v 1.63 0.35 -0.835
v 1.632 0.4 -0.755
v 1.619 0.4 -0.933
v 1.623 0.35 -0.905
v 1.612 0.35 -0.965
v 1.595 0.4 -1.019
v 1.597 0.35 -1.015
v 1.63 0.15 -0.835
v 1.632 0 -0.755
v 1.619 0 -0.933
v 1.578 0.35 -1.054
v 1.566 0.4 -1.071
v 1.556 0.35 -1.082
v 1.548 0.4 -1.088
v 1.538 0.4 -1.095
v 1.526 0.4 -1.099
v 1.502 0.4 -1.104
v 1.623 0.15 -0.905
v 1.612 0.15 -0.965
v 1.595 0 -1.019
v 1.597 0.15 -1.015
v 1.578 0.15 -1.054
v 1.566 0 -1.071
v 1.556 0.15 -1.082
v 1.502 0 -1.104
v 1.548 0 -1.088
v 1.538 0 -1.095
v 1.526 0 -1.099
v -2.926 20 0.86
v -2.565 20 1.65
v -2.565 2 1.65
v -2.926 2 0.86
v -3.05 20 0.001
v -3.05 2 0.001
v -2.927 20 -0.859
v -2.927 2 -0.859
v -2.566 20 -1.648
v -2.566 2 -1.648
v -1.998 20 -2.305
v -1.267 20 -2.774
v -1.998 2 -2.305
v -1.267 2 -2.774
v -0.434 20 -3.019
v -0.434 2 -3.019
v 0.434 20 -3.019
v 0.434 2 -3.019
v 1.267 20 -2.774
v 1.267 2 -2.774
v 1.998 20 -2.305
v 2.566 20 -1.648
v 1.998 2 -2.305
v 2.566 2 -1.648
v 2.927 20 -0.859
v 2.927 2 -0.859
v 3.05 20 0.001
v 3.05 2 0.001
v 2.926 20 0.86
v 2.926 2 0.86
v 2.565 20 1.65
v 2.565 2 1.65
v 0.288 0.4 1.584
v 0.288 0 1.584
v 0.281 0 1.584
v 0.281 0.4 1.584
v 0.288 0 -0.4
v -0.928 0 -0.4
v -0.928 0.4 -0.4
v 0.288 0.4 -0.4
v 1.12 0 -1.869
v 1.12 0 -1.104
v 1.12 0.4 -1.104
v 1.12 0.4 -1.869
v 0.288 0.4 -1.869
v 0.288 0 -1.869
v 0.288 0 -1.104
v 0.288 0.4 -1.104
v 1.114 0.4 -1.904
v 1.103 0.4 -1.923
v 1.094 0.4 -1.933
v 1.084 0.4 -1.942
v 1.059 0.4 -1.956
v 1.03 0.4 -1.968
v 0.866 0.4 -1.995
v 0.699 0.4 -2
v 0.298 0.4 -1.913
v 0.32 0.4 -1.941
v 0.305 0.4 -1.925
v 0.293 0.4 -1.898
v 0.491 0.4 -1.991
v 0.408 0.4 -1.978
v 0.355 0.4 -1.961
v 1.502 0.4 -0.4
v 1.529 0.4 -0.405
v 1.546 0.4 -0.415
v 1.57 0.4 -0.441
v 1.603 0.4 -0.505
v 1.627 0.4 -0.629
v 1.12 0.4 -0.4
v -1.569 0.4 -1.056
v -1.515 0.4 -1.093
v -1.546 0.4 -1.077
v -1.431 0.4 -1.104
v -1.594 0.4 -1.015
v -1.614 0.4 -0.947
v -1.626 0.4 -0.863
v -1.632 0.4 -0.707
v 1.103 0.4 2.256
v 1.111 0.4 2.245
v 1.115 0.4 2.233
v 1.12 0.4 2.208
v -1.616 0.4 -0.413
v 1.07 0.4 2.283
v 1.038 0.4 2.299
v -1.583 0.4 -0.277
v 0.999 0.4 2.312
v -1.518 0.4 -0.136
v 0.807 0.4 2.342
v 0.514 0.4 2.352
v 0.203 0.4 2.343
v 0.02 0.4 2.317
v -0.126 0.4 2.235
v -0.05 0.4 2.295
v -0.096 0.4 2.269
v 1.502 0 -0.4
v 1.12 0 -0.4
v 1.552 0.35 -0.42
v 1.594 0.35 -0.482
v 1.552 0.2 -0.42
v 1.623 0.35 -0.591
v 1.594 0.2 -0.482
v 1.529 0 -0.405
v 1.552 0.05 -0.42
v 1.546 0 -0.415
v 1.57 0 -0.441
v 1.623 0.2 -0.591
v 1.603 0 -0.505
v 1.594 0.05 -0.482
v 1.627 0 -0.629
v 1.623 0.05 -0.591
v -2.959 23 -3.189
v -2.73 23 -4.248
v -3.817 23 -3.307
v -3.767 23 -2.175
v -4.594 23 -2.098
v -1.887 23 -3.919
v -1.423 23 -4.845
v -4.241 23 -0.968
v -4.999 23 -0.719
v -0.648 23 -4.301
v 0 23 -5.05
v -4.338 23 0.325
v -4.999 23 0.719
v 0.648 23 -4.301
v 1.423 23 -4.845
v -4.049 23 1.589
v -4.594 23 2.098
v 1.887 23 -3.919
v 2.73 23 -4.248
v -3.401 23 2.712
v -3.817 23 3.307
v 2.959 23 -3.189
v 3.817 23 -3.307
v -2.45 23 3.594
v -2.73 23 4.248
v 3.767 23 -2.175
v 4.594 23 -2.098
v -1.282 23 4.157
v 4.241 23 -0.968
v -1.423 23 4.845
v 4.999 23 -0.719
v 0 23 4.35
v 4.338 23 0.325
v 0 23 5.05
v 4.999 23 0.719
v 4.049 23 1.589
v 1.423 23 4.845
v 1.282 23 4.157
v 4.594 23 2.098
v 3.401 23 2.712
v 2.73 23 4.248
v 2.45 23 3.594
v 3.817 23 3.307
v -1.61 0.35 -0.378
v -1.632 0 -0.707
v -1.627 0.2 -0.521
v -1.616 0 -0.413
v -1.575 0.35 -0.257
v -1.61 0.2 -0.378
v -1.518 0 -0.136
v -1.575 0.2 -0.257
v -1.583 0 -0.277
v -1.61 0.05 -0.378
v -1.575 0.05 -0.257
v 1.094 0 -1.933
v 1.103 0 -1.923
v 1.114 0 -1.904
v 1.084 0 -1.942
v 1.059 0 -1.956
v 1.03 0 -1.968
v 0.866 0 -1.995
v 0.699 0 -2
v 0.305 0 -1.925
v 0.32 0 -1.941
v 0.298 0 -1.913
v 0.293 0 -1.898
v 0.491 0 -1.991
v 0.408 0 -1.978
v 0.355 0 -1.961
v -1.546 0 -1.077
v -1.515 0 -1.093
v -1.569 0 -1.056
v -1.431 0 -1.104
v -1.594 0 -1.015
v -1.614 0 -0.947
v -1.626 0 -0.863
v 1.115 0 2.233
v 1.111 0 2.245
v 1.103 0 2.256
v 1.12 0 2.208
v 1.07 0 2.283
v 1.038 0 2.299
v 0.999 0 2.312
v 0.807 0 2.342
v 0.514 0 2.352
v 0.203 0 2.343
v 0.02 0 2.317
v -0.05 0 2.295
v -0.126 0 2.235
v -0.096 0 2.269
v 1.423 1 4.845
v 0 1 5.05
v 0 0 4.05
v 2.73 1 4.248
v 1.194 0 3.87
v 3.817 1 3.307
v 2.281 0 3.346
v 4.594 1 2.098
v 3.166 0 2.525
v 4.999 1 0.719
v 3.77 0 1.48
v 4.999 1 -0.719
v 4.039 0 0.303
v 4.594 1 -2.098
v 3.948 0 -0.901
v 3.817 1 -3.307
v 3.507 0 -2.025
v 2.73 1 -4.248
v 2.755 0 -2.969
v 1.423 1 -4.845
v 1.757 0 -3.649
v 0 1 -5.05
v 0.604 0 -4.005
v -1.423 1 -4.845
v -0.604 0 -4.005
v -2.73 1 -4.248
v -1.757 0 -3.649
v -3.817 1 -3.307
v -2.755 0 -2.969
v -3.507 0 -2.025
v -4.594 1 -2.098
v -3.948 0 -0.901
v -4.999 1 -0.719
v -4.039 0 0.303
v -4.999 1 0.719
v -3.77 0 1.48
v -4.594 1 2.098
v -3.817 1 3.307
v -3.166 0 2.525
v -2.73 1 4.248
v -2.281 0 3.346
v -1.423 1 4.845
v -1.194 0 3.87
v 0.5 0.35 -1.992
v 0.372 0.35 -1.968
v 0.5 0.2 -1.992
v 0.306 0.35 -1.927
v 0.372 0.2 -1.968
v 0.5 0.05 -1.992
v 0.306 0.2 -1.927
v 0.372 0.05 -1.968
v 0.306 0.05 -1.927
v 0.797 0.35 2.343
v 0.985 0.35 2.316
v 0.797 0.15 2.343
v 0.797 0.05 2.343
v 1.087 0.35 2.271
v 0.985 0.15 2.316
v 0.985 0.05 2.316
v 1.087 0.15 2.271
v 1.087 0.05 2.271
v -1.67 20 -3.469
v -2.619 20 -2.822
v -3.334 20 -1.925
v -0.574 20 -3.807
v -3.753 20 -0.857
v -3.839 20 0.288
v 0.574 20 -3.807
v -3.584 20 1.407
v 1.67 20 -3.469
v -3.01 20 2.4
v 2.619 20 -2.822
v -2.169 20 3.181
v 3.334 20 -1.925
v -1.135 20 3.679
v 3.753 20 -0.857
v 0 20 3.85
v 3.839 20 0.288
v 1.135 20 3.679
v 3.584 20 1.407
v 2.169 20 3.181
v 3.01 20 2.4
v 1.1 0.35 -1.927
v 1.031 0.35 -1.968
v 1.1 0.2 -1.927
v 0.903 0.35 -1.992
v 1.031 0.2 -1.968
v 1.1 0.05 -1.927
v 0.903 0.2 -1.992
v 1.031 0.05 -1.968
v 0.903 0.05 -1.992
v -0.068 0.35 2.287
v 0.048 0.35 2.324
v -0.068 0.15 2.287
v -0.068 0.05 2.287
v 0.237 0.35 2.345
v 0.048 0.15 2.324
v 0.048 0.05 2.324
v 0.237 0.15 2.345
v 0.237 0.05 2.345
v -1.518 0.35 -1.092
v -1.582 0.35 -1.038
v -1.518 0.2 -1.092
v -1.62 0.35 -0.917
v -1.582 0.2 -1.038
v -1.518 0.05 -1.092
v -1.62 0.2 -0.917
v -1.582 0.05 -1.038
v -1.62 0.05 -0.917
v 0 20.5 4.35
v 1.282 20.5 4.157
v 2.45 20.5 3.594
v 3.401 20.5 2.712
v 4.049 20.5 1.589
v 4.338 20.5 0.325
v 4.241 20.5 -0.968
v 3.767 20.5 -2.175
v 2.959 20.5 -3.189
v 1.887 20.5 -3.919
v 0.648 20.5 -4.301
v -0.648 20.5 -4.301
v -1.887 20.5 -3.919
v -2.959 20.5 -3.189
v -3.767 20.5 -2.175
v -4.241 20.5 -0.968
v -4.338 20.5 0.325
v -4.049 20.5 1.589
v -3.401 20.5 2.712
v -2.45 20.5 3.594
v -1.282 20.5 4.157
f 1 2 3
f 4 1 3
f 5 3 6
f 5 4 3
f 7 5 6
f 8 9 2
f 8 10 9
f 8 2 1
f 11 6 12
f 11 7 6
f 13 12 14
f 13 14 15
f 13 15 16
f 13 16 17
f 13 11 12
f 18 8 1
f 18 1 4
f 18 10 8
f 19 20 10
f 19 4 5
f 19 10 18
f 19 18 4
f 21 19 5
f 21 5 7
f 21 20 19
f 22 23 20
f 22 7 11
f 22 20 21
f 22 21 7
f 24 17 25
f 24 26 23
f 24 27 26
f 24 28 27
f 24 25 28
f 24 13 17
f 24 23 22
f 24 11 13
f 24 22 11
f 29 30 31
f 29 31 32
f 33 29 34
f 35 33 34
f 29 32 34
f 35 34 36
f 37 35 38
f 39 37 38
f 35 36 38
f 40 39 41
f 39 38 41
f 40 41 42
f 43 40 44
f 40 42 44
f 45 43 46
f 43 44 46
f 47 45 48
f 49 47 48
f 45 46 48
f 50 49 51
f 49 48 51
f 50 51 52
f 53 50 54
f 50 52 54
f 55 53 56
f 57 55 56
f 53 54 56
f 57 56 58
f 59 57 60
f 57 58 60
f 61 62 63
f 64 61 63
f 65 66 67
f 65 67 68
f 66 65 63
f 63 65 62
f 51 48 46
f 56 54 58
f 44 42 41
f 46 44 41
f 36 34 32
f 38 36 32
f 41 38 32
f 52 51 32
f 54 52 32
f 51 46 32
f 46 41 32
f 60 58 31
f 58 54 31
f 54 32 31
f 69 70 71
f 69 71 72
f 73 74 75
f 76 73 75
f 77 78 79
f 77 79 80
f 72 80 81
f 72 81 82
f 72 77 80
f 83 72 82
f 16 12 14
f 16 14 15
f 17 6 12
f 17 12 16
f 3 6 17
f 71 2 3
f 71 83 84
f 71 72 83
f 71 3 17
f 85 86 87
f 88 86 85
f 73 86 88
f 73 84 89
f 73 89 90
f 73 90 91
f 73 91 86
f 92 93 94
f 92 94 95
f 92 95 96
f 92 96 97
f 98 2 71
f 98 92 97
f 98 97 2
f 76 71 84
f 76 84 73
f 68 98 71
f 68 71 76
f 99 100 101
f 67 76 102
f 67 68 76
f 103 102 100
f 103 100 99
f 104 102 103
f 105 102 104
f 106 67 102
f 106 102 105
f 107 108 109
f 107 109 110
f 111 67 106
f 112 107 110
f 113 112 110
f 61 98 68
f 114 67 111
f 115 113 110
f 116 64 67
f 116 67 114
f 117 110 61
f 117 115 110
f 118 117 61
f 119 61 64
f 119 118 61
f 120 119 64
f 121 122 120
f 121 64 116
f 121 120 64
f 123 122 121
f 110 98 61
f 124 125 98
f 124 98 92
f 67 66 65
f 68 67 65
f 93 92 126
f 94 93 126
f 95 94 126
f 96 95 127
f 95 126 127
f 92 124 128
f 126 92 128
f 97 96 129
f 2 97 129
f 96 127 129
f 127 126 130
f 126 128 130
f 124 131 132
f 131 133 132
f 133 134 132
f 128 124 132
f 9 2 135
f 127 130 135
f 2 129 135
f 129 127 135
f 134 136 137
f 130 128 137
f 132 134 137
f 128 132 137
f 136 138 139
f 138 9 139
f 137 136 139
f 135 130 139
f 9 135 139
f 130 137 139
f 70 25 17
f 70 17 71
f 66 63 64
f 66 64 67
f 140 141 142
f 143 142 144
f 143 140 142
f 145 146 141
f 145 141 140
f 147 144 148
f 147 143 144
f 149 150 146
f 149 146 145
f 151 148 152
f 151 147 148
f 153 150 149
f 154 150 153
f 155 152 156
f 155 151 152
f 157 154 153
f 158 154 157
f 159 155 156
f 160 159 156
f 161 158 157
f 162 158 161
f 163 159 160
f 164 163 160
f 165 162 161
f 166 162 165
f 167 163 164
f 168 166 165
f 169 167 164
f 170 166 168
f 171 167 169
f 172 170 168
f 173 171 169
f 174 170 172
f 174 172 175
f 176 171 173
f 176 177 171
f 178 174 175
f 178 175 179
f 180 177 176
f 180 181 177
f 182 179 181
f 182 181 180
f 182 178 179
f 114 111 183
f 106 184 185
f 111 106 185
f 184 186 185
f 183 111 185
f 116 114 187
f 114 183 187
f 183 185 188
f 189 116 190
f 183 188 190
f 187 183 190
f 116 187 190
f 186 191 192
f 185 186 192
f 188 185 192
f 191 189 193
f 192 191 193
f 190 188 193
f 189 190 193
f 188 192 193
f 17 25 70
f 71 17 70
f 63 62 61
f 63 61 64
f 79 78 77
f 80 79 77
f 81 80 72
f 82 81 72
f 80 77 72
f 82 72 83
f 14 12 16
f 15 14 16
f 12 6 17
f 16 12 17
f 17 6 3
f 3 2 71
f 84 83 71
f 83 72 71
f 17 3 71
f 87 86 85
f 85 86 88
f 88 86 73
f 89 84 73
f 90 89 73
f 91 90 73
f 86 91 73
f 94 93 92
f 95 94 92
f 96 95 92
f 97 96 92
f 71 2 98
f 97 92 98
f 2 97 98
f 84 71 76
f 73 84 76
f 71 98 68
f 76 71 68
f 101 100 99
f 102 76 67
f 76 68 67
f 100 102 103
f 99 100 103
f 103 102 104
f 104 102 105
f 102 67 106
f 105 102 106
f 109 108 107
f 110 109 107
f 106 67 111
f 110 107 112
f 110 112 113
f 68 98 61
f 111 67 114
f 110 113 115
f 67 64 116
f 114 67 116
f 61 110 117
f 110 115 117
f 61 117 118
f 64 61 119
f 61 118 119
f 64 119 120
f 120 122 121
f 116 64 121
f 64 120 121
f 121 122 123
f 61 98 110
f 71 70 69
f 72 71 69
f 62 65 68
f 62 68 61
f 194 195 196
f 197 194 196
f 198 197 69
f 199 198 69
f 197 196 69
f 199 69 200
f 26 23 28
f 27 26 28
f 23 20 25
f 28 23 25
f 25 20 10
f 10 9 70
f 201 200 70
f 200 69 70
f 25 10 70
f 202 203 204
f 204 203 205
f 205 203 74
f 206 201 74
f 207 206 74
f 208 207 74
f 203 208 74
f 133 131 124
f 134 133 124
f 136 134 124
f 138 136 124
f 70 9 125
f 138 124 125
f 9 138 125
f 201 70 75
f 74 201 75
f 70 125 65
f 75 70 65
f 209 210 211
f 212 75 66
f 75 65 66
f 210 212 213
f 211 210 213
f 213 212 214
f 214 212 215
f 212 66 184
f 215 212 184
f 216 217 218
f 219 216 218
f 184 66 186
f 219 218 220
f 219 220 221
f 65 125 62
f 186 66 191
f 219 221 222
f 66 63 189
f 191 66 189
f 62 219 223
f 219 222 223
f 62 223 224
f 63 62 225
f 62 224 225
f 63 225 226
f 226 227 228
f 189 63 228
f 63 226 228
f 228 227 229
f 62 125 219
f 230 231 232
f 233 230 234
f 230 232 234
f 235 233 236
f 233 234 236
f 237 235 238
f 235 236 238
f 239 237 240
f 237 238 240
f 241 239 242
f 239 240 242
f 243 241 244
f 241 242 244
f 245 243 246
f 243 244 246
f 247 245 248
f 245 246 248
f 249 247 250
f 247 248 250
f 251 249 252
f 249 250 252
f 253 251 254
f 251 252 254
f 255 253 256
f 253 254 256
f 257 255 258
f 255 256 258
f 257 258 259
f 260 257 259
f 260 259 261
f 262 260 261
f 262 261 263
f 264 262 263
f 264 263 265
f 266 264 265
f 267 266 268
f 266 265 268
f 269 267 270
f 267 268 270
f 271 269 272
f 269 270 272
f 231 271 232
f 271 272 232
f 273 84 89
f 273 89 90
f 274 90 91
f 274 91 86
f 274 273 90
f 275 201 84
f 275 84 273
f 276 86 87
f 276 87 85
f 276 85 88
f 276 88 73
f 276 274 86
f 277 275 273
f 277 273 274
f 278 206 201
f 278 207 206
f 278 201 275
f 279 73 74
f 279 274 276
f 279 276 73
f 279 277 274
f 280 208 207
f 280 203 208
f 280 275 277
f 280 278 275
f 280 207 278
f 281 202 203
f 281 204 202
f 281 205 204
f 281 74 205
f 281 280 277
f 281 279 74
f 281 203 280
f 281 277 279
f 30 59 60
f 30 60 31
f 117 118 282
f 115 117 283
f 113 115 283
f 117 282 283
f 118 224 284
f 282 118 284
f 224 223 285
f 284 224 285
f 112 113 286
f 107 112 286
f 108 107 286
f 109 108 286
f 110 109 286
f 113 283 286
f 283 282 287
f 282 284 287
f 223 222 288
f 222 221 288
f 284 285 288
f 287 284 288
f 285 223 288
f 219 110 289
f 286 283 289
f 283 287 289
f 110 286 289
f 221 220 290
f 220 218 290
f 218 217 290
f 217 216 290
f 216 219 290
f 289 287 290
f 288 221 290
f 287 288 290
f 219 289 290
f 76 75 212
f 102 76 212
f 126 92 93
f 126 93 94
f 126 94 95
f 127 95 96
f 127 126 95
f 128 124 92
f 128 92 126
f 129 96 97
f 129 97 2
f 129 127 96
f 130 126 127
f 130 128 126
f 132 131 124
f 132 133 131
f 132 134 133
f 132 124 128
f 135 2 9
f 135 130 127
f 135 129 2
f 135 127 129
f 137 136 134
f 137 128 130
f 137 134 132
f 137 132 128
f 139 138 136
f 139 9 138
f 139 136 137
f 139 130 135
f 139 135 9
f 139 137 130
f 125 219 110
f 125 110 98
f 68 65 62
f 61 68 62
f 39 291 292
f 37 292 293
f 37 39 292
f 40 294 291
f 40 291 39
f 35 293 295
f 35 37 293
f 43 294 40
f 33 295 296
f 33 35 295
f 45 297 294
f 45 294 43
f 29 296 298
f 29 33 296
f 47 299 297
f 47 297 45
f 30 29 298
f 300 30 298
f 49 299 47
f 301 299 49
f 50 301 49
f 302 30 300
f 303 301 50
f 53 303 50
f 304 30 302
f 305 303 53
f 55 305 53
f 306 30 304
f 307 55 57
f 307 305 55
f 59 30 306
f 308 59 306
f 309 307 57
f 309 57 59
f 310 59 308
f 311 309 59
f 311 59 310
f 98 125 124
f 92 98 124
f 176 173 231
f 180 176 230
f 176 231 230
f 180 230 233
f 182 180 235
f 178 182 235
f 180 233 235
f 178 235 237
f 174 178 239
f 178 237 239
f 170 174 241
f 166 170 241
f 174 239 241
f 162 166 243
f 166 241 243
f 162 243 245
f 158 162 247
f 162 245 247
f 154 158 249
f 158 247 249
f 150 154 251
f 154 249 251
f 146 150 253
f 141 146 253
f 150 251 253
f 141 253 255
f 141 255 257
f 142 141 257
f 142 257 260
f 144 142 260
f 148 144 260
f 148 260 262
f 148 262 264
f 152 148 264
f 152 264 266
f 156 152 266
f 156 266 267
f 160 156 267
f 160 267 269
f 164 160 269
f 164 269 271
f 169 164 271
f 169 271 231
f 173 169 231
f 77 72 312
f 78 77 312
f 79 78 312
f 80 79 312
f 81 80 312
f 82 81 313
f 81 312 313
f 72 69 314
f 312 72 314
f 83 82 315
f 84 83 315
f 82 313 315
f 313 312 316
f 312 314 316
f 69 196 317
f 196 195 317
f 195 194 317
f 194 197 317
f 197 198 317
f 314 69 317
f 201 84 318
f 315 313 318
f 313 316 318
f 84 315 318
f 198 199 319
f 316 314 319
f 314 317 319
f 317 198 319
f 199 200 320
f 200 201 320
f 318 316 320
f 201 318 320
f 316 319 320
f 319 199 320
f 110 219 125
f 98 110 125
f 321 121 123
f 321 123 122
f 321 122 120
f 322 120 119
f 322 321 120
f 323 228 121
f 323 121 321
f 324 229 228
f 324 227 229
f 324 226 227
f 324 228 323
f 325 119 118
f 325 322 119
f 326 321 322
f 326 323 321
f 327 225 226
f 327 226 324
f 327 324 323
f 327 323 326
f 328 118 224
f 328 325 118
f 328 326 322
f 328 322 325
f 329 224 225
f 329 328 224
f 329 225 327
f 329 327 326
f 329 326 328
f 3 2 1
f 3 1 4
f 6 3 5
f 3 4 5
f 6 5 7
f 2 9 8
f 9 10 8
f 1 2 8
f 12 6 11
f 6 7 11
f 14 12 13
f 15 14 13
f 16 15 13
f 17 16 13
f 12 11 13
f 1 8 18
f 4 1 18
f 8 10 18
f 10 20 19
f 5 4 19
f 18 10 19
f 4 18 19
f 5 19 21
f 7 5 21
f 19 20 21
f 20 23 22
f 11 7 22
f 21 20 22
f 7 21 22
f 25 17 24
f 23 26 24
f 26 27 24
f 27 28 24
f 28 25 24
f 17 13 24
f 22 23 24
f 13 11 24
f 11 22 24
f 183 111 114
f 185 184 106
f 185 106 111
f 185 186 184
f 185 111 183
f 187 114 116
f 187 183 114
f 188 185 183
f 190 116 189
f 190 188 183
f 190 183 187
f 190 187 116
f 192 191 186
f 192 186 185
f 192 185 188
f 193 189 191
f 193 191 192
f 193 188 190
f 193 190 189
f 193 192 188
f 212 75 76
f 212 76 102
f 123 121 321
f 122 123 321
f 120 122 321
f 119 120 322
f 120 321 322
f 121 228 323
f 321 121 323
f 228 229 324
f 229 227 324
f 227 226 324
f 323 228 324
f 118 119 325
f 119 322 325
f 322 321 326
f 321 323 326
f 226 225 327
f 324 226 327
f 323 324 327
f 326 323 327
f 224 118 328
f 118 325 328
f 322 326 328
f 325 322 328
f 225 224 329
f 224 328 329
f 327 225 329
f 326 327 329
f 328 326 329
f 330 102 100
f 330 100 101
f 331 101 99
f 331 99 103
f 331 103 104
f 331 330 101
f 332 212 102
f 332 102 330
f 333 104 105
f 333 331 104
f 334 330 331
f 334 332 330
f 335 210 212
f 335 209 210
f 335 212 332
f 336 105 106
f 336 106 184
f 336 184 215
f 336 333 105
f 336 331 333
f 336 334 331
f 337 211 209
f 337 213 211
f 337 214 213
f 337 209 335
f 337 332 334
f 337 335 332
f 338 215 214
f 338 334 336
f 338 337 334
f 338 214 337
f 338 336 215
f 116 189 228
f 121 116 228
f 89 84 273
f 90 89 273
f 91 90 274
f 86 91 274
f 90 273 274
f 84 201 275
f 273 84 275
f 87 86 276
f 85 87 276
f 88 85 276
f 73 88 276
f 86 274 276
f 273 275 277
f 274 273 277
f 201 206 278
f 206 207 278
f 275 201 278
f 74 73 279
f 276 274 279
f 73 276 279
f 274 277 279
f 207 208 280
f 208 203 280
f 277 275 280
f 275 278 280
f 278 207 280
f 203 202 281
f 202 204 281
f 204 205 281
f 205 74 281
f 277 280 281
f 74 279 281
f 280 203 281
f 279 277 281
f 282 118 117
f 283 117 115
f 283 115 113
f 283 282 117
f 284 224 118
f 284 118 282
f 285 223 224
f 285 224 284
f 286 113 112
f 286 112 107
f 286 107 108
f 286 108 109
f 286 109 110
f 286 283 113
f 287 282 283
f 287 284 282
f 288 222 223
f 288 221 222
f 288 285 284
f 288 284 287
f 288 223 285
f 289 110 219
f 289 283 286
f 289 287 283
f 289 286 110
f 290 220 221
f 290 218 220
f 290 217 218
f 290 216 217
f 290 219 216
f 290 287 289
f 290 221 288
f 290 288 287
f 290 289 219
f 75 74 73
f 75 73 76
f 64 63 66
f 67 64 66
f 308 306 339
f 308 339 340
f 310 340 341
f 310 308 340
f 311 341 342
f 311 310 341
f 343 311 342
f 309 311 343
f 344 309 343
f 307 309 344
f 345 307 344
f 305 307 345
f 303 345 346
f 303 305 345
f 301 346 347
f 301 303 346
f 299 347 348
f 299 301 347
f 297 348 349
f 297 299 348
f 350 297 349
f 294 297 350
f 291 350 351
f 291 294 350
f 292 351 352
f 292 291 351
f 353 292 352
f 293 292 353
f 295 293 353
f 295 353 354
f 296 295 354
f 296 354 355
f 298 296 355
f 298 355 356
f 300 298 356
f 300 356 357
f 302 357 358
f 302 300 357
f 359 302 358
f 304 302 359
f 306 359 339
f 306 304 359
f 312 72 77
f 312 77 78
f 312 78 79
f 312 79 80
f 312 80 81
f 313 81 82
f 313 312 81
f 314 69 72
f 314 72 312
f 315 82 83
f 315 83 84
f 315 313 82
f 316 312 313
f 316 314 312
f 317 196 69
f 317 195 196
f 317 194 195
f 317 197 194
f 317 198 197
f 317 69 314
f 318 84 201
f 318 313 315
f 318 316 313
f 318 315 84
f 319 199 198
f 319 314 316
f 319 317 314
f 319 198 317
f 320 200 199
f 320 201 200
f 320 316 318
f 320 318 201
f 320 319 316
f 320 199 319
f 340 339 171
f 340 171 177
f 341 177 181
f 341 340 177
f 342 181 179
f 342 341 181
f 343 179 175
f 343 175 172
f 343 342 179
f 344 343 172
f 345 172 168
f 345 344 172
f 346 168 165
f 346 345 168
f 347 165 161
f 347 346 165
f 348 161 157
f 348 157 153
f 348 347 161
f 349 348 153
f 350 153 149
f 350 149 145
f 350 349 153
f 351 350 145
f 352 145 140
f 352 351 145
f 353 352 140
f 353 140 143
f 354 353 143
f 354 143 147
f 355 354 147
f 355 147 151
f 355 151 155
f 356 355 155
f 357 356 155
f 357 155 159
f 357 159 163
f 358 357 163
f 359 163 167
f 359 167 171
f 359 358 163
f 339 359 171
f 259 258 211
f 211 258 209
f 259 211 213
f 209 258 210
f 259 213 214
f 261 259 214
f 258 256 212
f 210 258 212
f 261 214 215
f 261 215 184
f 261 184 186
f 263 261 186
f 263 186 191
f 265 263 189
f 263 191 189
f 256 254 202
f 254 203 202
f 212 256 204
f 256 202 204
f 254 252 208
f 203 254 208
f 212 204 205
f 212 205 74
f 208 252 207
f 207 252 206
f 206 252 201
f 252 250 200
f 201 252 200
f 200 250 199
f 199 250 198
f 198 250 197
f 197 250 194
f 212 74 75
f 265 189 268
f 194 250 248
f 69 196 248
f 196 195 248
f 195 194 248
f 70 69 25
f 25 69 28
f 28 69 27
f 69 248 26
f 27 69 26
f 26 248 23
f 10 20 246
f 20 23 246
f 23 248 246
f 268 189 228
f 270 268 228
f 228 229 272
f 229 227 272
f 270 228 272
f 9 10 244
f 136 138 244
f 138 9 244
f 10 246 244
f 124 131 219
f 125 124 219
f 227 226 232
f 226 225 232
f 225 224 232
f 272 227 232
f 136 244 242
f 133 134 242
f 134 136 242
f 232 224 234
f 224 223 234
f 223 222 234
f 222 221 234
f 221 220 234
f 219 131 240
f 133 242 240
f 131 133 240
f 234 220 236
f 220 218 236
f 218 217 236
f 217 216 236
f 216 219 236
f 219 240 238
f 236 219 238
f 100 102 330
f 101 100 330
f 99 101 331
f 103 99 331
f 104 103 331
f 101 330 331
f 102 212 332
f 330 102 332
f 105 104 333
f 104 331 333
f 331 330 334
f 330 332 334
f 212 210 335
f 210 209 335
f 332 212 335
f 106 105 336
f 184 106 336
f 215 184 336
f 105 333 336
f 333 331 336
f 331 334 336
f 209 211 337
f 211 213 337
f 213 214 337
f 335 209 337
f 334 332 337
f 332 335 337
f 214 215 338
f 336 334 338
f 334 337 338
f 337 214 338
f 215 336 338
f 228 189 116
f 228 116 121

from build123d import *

# Parameters (mm, degrees)
SKETCH1_R           = 5.05
BOSS_EXTRUDE1_DEPTH = 20
SKETCH2_R           = 5.05
BOSS_EXTRUDE2_DEPTH = 2
SKETCH4_R           = 5.05
SKETCH4_R_2         = 4.35
BOSS_EXTRUDE3_DEPTH = 3
CHAMFER1_SIZE       = 1
CHAMFER2_SIZE       = 0.5
CUT_EXTRUDE1_DEPTH  = 0.4
BOSS_EXTRUDE4_DEPTH = 0.4


with BuildPart() as part:
    # Sketch1 → Boss-Extrude1 (new body)
    with BuildSketch(Plane(origin=(0, 0, 0), x_dir=(1, 0, 0), z_dir=(0, 1, 0))):
        Circle(SKETCH1_R)
        with BuildLine():
            Line((2.565151068, -1.65), (-2.565151068, -1.65))
            ThreePointArc((-2.565151068, -1.65), (0, 3.05), (2.565151068, -1.65))
        make_face(mode=Mode.SUBTRACT)
    extrude(amount=BOSS_EXTRUDE1_DEPTH)

    # Sketch2 → Boss-Extrude2 (add)
    with BuildSketch(Plane.XZ):
        Circle(SKETCH2_R)
    extrude(amount=-BOSS_EXTRUDE2_DEPTH)

    # Sketch4 → Boss-Extrude3 (add)
    with BuildSketch(Plane(origin=(0, 20, 0), x_dir=(1, 0, 0), z_dir=(0, 1, 0))):
        Circle(SKETCH4_R)
        Circle(SKETCH4_R_2, mode=Mode.SUBTRACT)
    extrude(amount=BOSS_EXTRUDE3_DEPTH)

    # Chamfer1
    chamfer1_edges = [part.edges().sort_by_distance(p)[0] for p in [
        (-5.05, 0, 0),
    ]]
    chamfer(chamfer1_edges, length=CHAMFER1_SIZE)

    # Chamfer2
    chamfer2_edges = [part.edges().sort_by_distance(p)[0] for p in [
        (-4.35, 20, 0),
    ]]
    chamfer(chamfer2_edges, length=CHAMFER2_SIZE)

    # Sketch5 → Cut-Extrude1 (cut)
    with BuildSketch(Plane.XZ):
        with BuildLine():
            add(Edge.make_bspline(
                [(1.631941732, -0.755044451), (1.631711834, -0.781729287), (1.631279836, -0.83187248), (1.624169455, -0.902071791), (1.61354776, -0.962360211), (1.59926486, -1.012775634), (1.580315281, -1.052346406), (1.558755386, -1.082359327), (1.53114696, -1.099834777), (1.51147004, -1.102663084), (1.501946373, -1.10403199)],
                knots=[0, 0, 0, 0, 1.593603655, 2.994523807, 4.209267046, 5.248799156, 6.112701127, 6.821812225, 7.429754874, 8, 8, 8, 8], degree=3))
            Line((1.501946373, -1.10403199), (1.119960012, -1.10403199))
            Line((1.119960012, -1.10403199), (1.119960012, -1.869004677))
            add(Edge.make_bspline(
                [(1.119960012, -1.869004677), (1.1190276, -1.879514942), (1.11717803, -1.900363512), (1.100781449, -1.929606387), (1.070457056, -1.952360817), (1.02775066, -1.970719903), (0.970204741, -1.983922011), (0.897251108, -1.993498632), (0.805057261, -1.999216421), (0.736982299, -1.999719258), (0.698975043, -2)],
                knots=[0, 0, 0, 0, 0.525703783, 1.042806514, 1.625893093, 2.39765282, 3.364048858, 4.581030562, 6.091138931, 8, 8, 8, 8], degree=3))
            add(Edge.make_bspline(
                [(0.698975043, -2), (0.662638483, -1.999680966), (0.596237721, -1.99909797), (0.505670365, -1.993549267), (0.432822332, -1.9837837), (0.375587998, -1.97121932), (0.334351205, -1.952054514), (0.304709495, -1.929821711), (0.291231595, -1.899809452), (0.289087047, -1.87943166), (0.287989717, -1.869004677)],
                knots=[0, 0, 0, 0, 1.858233089, 3.39570102, 4.63473153, 5.61863636, 6.373449397, 6.953985978, 7.464771718, 8, 8, 8, 8], degree=3))
            Line((0.287989717, -1.869004677), (0.287989717, -1.10403199))
            Line((0.287989717, -1.10403199), (-1.430948908, -1.10403199))
            add(Edge.make_bspline(
                [(-1.430948908, -1.10403199), (-1.446295186, -1.103412765), (-1.475615652, -1.102229679), (-1.518140665, -1.094427216), (-1.555773037, -1.073109541), (-1.58616843, -1.036199626), (-1.607165622, -0.982245201), (-1.622758573, -0.910508327), (-1.630623202, -0.816535459), (-1.631467974, -0.746386513), (-1.631941732, -0.707046165)],
                knots=[0, 0, 0, 0, 0.721830018, 1.379122135, 2.010344175, 2.710096748, 3.579823955, 4.704200885, 6.15167733, 8, 8, 8, 8], degree=3))
            add(Edge.make_bspline(
                [(-1.631941732, -0.707046165), (-1.631855992, -0.673710867), (-1.63169644, -0.611677654), (-1.627859181, -0.524581605), (-1.620675539, -0.448197107), (-1.61140423, -0.379463469), (-1.595930544, -0.316289463), (-1.575663182, -0.255996569), (-1.54871653, -0.196367872), (-1.528447294, -0.156646299), (-1.517945802, -0.136066551)],
                knots=[0, 0, 0, 0, 1.355920511, 2.523214427, 3.544523483, 4.476419512, 5.341300522, 6.18596521, 7.060148557, 8, 8, 8, 8], degree=3))
            Line((-1.517945802, -0.136066551), (-0.125995501, 2.234848795))
            add(Edge.make_bspline(
                [(-0.125995501, 2.234848795), (-0.118826649, 2.244678179), (-0.103261763, 2.266019564), (-0.065190235, 2.290144018), (-0.013803763, 2.309357894), (0.053587112, 2.326305114), (0.138951007, 2.338732104), (0.244225735, 2.345752456), (0.371271055, 2.350790371), (0.46364318, 2.351472752), (0.513981648, 2.351844618)],
                knots=[0, 0, 0, 0, 0.433899394, 0.942074677, 1.586920186, 2.403031765, 3.43269784, 4.681722832, 6.191694851, 8, 8, 8, 8], degree=3))
            add(Edge.make_bspline(
                [(0.513981648, 2.351844618), (0.565330252, 2.351666334), (0.659751295, 2.351338501), (0.789464206, 2.344069356), (0.895633515, 2.33449455), (0.978826037, 2.318529599), (1.042071686, 2.300153794), (1.085226569, 2.274596454), (1.115197825, 2.244496698), (1.118421934, 2.219685887), (1.119960012, 2.207849759)],
                knots=[0, 0, 0, 0, 1.870363282, 3.439268813, 4.733465961, 5.748069416, 6.52766601, 7.110840176, 7.575821608, 8, 8, 8, 8], degree=3))
            Line((1.119960012, 2.207849759), (1.119960012, -0.400057126))
            Line((1.119960012, -0.400057126), (1.501946373, -0.400057126))
            add(Edge.make_bspline(
                [(1.501946373, -0.400057126), (1.510823484, -0.401063547), (1.529189779, -0.403145781), (1.554586269, -0.420271717), (1.576158449, -0.44744336), (1.596465382, -0.484491265), (1.613298175, -0.533336076), (1.624583151, -0.595271866), (1.631275777, -0.67056467), (1.631707747, -0.725362278), (1.631941732, -0.755044451)],
                knots=[0, 0, 0, 0, 0.51983486, 1.075512151, 1.744218405, 2.552791553, 3.552578929, 4.773200779, 6.252142485, 8, 8, 8, 8], degree=3))
        make_face()
        Polygon((0.287989717, 1.583872038), (0.280989967, 1.583872038), (-0.927966867, -0.400057126), (0.287989717, -0.400057126), align=None, mode=Mode.SUBTRACT)
    extrude(amount=-CUT_EXTRUDE1_DEPTH, mode=Mode.SUBTRACT)


with BuildPart() as body_2:
    # Sketch5<2> → Boss-Extrude4 (new body)
    with BuildSketch(Plane.XZ):
        with BuildLine():
            add(Edge.make_bspline(
                [(1.631941732, -0.755044451), (1.631711834, -0.781729287), (1.631279836, -0.83187248), (1.624169455, -0.902071791), (1.61354776, -0.962360211), (1.59926486, -1.012775634), (1.580315281, -1.052346406), (1.558755386, -1.082359327), (1.53114696, -1.099834777), (1.51147004, -1.102663084), (1.501946373, -1.10403199)],
                knots=[0, 0, 0, 0, 1.593603655, 2.994523807, 4.209267046, 5.248799156, 6.112701127, 6.821812225, 7.429754874, 8, 8, 8, 8], degree=3))
            Line((1.501946373, -1.10403199), (1.119960012, -1.10403199))
            Line((1.119960012, -1.10403199), (1.119960012, -1.869004677))
            add(Edge.make_bspline(
                [(1.119960012, -1.869004677), (1.1190276, -1.879514942), (1.11717803, -1.900363512), (1.100781449, -1.929606387), (1.070457056, -1.952360817), (1.02775066, -1.970719903), (0.970204741, -1.983922011), (0.897251108, -1.993498632), (0.805057261, -1.999216421), (0.736982299, -1.999719258), (0.698975043, -2)],
                knots=[0, 0, 0, 0, 0.525703783, 1.042806514, 1.625893093, 2.39765282, 3.364048858, 4.581030562, 6.091138931, 8, 8, 8, 8], degree=3))
            add(Edge.make_bspline(
                [(0.698975043, -2), (0.662638483, -1.999680966), (0.596237721, -1.99909797), (0.505670365, -1.993549267), (0.432822332, -1.9837837), (0.375587998, -1.97121932), (0.334351205, -1.952054514), (0.304709495, -1.929821711), (0.291231595, -1.899809452), (0.289087047, -1.87943166), (0.287989717, -1.869004677)],
                knots=[0, 0, 0, 0, 1.858233089, 3.39570102, 4.63473153, 5.61863636, 6.373449397, 6.953985978, 7.464771718, 8, 8, 8, 8], degree=3))
            Line((0.287989717, -1.869004677), (0.287989717, -1.10403199))
            Line((0.287989717, -1.10403199), (-1.430948908, -1.10403199))
            add(Edge.make_bspline(
                [(-1.430948908, -1.10403199), (-1.446295186, -1.103412765), (-1.475615652, -1.102229679), (-1.518140665, -1.094427216), (-1.555773037, -1.073109541), (-1.58616843, -1.036199626), (-1.607165622, -0.982245201), (-1.622758573, -0.910508327), (-1.630623202, -0.816535459), (-1.631467974, -0.746386513), (-1.631941732, -0.707046165)],
                knots=[0, 0, 0, 0, 0.721830018, 1.379122135, 2.010344175, 2.710096748, 3.579823955, 4.704200885, 6.15167733, 8, 8, 8, 8], degree=3))
            add(Edge.make_bspline(
                [(-1.631941732, -0.707046165), (-1.631855992, -0.673710867), (-1.63169644, -0.611677654), (-1.627859181, -0.524581605), (-1.620675539, -0.448197107), (-1.61140423, -0.379463469), (-1.595930544, -0.316289463), (-1.575663182, -0.255996569), (-1.54871653, -0.196367872), (-1.528447294, -0.156646299), (-1.517945802, -0.136066551)],
                knots=[0, 0, 0, 0, 1.355920511, 2.523214427, 3.544523483, 4.476419512, 5.341300522, 6.18596521, 7.060148557, 8, 8, 8, 8], degree=3))
            Line((-1.517945802, -0.136066551), (-0.125995501, 2.234848795))
            add(Edge.make_bspline(
                [(-0.125995501, 2.234848795), (-0.118826649, 2.244678179), (-0.103261763, 2.266019564), (-0.065190235, 2.290144018), (-0.013803763, 2.309357894), (0.053587112, 2.326305114), (0.138951007, 2.338732104), (0.244225735, 2.345752456), (0.371271055, 2.350790371), (0.46364318, 2.351472752), (0.513981648, 2.351844618)],
                knots=[0, 0, 0, 0, 0.433899394, 0.942074677, 1.586920186, 2.403031765, 3.43269784, 4.681722832, 6.191694851, 8, 8, 8, 8], degree=3))
            add(Edge.make_bspline(
                [(0.513981648, 2.351844618), (0.565330252, 2.351666334), (0.659751295, 2.351338501), (0.789464206, 2.344069356), (0.895633515, 2.33449455), (0.978826037, 2.318529599), (1.042071686, 2.300153794), (1.085226569, 2.274596454), (1.115197825, 2.244496698), (1.118421934, 2.219685887), (1.119960012, 2.207849759)],
                knots=[0, 0, 0, 0, 1.870363282, 3.439268813, 4.733465961, 5.748069416, 6.52766601, 7.110840176, 7.575821608, 8, 8, 8, 8], degree=3))
            Line((1.119960012, 2.207849759), (1.119960012, -0.400057126))
            Line((1.119960012, -0.400057126), (1.501946373, -0.400057126))
            add(Edge.make_bspline(
                [(1.501946373, -0.400057126), (1.510823484, -0.401063547), (1.529189779, -0.403145781), (1.554586269, -0.420271717), (1.576158449, -0.44744336), (1.596465382, -0.484491265), (1.613298175, -0.533336076), (1.624583151, -0.595271866), (1.631275777, -0.67056467), (1.631707747, -0.725362278), (1.631941732, -0.755044451)],
                knots=[0, 0, 0, 0, 0.51983486, 1.075512151, 1.744218405, 2.552791553, 3.552578929, 4.773200779, 6.252142485, 8, 8, 8, 8], degree=3))
        make_face()
        Polygon((0.287989717, 1.583872038), (0.280989967, 1.583872038), (-0.927966867, -0.400057126), (0.287989717, -0.400057126), align=None, mode=Mode.SUBTRACT)
    extrude(amount=-BOSS_EXTRUDE4_DEPTH)


solid = Compound([part.part, body_2.part])
